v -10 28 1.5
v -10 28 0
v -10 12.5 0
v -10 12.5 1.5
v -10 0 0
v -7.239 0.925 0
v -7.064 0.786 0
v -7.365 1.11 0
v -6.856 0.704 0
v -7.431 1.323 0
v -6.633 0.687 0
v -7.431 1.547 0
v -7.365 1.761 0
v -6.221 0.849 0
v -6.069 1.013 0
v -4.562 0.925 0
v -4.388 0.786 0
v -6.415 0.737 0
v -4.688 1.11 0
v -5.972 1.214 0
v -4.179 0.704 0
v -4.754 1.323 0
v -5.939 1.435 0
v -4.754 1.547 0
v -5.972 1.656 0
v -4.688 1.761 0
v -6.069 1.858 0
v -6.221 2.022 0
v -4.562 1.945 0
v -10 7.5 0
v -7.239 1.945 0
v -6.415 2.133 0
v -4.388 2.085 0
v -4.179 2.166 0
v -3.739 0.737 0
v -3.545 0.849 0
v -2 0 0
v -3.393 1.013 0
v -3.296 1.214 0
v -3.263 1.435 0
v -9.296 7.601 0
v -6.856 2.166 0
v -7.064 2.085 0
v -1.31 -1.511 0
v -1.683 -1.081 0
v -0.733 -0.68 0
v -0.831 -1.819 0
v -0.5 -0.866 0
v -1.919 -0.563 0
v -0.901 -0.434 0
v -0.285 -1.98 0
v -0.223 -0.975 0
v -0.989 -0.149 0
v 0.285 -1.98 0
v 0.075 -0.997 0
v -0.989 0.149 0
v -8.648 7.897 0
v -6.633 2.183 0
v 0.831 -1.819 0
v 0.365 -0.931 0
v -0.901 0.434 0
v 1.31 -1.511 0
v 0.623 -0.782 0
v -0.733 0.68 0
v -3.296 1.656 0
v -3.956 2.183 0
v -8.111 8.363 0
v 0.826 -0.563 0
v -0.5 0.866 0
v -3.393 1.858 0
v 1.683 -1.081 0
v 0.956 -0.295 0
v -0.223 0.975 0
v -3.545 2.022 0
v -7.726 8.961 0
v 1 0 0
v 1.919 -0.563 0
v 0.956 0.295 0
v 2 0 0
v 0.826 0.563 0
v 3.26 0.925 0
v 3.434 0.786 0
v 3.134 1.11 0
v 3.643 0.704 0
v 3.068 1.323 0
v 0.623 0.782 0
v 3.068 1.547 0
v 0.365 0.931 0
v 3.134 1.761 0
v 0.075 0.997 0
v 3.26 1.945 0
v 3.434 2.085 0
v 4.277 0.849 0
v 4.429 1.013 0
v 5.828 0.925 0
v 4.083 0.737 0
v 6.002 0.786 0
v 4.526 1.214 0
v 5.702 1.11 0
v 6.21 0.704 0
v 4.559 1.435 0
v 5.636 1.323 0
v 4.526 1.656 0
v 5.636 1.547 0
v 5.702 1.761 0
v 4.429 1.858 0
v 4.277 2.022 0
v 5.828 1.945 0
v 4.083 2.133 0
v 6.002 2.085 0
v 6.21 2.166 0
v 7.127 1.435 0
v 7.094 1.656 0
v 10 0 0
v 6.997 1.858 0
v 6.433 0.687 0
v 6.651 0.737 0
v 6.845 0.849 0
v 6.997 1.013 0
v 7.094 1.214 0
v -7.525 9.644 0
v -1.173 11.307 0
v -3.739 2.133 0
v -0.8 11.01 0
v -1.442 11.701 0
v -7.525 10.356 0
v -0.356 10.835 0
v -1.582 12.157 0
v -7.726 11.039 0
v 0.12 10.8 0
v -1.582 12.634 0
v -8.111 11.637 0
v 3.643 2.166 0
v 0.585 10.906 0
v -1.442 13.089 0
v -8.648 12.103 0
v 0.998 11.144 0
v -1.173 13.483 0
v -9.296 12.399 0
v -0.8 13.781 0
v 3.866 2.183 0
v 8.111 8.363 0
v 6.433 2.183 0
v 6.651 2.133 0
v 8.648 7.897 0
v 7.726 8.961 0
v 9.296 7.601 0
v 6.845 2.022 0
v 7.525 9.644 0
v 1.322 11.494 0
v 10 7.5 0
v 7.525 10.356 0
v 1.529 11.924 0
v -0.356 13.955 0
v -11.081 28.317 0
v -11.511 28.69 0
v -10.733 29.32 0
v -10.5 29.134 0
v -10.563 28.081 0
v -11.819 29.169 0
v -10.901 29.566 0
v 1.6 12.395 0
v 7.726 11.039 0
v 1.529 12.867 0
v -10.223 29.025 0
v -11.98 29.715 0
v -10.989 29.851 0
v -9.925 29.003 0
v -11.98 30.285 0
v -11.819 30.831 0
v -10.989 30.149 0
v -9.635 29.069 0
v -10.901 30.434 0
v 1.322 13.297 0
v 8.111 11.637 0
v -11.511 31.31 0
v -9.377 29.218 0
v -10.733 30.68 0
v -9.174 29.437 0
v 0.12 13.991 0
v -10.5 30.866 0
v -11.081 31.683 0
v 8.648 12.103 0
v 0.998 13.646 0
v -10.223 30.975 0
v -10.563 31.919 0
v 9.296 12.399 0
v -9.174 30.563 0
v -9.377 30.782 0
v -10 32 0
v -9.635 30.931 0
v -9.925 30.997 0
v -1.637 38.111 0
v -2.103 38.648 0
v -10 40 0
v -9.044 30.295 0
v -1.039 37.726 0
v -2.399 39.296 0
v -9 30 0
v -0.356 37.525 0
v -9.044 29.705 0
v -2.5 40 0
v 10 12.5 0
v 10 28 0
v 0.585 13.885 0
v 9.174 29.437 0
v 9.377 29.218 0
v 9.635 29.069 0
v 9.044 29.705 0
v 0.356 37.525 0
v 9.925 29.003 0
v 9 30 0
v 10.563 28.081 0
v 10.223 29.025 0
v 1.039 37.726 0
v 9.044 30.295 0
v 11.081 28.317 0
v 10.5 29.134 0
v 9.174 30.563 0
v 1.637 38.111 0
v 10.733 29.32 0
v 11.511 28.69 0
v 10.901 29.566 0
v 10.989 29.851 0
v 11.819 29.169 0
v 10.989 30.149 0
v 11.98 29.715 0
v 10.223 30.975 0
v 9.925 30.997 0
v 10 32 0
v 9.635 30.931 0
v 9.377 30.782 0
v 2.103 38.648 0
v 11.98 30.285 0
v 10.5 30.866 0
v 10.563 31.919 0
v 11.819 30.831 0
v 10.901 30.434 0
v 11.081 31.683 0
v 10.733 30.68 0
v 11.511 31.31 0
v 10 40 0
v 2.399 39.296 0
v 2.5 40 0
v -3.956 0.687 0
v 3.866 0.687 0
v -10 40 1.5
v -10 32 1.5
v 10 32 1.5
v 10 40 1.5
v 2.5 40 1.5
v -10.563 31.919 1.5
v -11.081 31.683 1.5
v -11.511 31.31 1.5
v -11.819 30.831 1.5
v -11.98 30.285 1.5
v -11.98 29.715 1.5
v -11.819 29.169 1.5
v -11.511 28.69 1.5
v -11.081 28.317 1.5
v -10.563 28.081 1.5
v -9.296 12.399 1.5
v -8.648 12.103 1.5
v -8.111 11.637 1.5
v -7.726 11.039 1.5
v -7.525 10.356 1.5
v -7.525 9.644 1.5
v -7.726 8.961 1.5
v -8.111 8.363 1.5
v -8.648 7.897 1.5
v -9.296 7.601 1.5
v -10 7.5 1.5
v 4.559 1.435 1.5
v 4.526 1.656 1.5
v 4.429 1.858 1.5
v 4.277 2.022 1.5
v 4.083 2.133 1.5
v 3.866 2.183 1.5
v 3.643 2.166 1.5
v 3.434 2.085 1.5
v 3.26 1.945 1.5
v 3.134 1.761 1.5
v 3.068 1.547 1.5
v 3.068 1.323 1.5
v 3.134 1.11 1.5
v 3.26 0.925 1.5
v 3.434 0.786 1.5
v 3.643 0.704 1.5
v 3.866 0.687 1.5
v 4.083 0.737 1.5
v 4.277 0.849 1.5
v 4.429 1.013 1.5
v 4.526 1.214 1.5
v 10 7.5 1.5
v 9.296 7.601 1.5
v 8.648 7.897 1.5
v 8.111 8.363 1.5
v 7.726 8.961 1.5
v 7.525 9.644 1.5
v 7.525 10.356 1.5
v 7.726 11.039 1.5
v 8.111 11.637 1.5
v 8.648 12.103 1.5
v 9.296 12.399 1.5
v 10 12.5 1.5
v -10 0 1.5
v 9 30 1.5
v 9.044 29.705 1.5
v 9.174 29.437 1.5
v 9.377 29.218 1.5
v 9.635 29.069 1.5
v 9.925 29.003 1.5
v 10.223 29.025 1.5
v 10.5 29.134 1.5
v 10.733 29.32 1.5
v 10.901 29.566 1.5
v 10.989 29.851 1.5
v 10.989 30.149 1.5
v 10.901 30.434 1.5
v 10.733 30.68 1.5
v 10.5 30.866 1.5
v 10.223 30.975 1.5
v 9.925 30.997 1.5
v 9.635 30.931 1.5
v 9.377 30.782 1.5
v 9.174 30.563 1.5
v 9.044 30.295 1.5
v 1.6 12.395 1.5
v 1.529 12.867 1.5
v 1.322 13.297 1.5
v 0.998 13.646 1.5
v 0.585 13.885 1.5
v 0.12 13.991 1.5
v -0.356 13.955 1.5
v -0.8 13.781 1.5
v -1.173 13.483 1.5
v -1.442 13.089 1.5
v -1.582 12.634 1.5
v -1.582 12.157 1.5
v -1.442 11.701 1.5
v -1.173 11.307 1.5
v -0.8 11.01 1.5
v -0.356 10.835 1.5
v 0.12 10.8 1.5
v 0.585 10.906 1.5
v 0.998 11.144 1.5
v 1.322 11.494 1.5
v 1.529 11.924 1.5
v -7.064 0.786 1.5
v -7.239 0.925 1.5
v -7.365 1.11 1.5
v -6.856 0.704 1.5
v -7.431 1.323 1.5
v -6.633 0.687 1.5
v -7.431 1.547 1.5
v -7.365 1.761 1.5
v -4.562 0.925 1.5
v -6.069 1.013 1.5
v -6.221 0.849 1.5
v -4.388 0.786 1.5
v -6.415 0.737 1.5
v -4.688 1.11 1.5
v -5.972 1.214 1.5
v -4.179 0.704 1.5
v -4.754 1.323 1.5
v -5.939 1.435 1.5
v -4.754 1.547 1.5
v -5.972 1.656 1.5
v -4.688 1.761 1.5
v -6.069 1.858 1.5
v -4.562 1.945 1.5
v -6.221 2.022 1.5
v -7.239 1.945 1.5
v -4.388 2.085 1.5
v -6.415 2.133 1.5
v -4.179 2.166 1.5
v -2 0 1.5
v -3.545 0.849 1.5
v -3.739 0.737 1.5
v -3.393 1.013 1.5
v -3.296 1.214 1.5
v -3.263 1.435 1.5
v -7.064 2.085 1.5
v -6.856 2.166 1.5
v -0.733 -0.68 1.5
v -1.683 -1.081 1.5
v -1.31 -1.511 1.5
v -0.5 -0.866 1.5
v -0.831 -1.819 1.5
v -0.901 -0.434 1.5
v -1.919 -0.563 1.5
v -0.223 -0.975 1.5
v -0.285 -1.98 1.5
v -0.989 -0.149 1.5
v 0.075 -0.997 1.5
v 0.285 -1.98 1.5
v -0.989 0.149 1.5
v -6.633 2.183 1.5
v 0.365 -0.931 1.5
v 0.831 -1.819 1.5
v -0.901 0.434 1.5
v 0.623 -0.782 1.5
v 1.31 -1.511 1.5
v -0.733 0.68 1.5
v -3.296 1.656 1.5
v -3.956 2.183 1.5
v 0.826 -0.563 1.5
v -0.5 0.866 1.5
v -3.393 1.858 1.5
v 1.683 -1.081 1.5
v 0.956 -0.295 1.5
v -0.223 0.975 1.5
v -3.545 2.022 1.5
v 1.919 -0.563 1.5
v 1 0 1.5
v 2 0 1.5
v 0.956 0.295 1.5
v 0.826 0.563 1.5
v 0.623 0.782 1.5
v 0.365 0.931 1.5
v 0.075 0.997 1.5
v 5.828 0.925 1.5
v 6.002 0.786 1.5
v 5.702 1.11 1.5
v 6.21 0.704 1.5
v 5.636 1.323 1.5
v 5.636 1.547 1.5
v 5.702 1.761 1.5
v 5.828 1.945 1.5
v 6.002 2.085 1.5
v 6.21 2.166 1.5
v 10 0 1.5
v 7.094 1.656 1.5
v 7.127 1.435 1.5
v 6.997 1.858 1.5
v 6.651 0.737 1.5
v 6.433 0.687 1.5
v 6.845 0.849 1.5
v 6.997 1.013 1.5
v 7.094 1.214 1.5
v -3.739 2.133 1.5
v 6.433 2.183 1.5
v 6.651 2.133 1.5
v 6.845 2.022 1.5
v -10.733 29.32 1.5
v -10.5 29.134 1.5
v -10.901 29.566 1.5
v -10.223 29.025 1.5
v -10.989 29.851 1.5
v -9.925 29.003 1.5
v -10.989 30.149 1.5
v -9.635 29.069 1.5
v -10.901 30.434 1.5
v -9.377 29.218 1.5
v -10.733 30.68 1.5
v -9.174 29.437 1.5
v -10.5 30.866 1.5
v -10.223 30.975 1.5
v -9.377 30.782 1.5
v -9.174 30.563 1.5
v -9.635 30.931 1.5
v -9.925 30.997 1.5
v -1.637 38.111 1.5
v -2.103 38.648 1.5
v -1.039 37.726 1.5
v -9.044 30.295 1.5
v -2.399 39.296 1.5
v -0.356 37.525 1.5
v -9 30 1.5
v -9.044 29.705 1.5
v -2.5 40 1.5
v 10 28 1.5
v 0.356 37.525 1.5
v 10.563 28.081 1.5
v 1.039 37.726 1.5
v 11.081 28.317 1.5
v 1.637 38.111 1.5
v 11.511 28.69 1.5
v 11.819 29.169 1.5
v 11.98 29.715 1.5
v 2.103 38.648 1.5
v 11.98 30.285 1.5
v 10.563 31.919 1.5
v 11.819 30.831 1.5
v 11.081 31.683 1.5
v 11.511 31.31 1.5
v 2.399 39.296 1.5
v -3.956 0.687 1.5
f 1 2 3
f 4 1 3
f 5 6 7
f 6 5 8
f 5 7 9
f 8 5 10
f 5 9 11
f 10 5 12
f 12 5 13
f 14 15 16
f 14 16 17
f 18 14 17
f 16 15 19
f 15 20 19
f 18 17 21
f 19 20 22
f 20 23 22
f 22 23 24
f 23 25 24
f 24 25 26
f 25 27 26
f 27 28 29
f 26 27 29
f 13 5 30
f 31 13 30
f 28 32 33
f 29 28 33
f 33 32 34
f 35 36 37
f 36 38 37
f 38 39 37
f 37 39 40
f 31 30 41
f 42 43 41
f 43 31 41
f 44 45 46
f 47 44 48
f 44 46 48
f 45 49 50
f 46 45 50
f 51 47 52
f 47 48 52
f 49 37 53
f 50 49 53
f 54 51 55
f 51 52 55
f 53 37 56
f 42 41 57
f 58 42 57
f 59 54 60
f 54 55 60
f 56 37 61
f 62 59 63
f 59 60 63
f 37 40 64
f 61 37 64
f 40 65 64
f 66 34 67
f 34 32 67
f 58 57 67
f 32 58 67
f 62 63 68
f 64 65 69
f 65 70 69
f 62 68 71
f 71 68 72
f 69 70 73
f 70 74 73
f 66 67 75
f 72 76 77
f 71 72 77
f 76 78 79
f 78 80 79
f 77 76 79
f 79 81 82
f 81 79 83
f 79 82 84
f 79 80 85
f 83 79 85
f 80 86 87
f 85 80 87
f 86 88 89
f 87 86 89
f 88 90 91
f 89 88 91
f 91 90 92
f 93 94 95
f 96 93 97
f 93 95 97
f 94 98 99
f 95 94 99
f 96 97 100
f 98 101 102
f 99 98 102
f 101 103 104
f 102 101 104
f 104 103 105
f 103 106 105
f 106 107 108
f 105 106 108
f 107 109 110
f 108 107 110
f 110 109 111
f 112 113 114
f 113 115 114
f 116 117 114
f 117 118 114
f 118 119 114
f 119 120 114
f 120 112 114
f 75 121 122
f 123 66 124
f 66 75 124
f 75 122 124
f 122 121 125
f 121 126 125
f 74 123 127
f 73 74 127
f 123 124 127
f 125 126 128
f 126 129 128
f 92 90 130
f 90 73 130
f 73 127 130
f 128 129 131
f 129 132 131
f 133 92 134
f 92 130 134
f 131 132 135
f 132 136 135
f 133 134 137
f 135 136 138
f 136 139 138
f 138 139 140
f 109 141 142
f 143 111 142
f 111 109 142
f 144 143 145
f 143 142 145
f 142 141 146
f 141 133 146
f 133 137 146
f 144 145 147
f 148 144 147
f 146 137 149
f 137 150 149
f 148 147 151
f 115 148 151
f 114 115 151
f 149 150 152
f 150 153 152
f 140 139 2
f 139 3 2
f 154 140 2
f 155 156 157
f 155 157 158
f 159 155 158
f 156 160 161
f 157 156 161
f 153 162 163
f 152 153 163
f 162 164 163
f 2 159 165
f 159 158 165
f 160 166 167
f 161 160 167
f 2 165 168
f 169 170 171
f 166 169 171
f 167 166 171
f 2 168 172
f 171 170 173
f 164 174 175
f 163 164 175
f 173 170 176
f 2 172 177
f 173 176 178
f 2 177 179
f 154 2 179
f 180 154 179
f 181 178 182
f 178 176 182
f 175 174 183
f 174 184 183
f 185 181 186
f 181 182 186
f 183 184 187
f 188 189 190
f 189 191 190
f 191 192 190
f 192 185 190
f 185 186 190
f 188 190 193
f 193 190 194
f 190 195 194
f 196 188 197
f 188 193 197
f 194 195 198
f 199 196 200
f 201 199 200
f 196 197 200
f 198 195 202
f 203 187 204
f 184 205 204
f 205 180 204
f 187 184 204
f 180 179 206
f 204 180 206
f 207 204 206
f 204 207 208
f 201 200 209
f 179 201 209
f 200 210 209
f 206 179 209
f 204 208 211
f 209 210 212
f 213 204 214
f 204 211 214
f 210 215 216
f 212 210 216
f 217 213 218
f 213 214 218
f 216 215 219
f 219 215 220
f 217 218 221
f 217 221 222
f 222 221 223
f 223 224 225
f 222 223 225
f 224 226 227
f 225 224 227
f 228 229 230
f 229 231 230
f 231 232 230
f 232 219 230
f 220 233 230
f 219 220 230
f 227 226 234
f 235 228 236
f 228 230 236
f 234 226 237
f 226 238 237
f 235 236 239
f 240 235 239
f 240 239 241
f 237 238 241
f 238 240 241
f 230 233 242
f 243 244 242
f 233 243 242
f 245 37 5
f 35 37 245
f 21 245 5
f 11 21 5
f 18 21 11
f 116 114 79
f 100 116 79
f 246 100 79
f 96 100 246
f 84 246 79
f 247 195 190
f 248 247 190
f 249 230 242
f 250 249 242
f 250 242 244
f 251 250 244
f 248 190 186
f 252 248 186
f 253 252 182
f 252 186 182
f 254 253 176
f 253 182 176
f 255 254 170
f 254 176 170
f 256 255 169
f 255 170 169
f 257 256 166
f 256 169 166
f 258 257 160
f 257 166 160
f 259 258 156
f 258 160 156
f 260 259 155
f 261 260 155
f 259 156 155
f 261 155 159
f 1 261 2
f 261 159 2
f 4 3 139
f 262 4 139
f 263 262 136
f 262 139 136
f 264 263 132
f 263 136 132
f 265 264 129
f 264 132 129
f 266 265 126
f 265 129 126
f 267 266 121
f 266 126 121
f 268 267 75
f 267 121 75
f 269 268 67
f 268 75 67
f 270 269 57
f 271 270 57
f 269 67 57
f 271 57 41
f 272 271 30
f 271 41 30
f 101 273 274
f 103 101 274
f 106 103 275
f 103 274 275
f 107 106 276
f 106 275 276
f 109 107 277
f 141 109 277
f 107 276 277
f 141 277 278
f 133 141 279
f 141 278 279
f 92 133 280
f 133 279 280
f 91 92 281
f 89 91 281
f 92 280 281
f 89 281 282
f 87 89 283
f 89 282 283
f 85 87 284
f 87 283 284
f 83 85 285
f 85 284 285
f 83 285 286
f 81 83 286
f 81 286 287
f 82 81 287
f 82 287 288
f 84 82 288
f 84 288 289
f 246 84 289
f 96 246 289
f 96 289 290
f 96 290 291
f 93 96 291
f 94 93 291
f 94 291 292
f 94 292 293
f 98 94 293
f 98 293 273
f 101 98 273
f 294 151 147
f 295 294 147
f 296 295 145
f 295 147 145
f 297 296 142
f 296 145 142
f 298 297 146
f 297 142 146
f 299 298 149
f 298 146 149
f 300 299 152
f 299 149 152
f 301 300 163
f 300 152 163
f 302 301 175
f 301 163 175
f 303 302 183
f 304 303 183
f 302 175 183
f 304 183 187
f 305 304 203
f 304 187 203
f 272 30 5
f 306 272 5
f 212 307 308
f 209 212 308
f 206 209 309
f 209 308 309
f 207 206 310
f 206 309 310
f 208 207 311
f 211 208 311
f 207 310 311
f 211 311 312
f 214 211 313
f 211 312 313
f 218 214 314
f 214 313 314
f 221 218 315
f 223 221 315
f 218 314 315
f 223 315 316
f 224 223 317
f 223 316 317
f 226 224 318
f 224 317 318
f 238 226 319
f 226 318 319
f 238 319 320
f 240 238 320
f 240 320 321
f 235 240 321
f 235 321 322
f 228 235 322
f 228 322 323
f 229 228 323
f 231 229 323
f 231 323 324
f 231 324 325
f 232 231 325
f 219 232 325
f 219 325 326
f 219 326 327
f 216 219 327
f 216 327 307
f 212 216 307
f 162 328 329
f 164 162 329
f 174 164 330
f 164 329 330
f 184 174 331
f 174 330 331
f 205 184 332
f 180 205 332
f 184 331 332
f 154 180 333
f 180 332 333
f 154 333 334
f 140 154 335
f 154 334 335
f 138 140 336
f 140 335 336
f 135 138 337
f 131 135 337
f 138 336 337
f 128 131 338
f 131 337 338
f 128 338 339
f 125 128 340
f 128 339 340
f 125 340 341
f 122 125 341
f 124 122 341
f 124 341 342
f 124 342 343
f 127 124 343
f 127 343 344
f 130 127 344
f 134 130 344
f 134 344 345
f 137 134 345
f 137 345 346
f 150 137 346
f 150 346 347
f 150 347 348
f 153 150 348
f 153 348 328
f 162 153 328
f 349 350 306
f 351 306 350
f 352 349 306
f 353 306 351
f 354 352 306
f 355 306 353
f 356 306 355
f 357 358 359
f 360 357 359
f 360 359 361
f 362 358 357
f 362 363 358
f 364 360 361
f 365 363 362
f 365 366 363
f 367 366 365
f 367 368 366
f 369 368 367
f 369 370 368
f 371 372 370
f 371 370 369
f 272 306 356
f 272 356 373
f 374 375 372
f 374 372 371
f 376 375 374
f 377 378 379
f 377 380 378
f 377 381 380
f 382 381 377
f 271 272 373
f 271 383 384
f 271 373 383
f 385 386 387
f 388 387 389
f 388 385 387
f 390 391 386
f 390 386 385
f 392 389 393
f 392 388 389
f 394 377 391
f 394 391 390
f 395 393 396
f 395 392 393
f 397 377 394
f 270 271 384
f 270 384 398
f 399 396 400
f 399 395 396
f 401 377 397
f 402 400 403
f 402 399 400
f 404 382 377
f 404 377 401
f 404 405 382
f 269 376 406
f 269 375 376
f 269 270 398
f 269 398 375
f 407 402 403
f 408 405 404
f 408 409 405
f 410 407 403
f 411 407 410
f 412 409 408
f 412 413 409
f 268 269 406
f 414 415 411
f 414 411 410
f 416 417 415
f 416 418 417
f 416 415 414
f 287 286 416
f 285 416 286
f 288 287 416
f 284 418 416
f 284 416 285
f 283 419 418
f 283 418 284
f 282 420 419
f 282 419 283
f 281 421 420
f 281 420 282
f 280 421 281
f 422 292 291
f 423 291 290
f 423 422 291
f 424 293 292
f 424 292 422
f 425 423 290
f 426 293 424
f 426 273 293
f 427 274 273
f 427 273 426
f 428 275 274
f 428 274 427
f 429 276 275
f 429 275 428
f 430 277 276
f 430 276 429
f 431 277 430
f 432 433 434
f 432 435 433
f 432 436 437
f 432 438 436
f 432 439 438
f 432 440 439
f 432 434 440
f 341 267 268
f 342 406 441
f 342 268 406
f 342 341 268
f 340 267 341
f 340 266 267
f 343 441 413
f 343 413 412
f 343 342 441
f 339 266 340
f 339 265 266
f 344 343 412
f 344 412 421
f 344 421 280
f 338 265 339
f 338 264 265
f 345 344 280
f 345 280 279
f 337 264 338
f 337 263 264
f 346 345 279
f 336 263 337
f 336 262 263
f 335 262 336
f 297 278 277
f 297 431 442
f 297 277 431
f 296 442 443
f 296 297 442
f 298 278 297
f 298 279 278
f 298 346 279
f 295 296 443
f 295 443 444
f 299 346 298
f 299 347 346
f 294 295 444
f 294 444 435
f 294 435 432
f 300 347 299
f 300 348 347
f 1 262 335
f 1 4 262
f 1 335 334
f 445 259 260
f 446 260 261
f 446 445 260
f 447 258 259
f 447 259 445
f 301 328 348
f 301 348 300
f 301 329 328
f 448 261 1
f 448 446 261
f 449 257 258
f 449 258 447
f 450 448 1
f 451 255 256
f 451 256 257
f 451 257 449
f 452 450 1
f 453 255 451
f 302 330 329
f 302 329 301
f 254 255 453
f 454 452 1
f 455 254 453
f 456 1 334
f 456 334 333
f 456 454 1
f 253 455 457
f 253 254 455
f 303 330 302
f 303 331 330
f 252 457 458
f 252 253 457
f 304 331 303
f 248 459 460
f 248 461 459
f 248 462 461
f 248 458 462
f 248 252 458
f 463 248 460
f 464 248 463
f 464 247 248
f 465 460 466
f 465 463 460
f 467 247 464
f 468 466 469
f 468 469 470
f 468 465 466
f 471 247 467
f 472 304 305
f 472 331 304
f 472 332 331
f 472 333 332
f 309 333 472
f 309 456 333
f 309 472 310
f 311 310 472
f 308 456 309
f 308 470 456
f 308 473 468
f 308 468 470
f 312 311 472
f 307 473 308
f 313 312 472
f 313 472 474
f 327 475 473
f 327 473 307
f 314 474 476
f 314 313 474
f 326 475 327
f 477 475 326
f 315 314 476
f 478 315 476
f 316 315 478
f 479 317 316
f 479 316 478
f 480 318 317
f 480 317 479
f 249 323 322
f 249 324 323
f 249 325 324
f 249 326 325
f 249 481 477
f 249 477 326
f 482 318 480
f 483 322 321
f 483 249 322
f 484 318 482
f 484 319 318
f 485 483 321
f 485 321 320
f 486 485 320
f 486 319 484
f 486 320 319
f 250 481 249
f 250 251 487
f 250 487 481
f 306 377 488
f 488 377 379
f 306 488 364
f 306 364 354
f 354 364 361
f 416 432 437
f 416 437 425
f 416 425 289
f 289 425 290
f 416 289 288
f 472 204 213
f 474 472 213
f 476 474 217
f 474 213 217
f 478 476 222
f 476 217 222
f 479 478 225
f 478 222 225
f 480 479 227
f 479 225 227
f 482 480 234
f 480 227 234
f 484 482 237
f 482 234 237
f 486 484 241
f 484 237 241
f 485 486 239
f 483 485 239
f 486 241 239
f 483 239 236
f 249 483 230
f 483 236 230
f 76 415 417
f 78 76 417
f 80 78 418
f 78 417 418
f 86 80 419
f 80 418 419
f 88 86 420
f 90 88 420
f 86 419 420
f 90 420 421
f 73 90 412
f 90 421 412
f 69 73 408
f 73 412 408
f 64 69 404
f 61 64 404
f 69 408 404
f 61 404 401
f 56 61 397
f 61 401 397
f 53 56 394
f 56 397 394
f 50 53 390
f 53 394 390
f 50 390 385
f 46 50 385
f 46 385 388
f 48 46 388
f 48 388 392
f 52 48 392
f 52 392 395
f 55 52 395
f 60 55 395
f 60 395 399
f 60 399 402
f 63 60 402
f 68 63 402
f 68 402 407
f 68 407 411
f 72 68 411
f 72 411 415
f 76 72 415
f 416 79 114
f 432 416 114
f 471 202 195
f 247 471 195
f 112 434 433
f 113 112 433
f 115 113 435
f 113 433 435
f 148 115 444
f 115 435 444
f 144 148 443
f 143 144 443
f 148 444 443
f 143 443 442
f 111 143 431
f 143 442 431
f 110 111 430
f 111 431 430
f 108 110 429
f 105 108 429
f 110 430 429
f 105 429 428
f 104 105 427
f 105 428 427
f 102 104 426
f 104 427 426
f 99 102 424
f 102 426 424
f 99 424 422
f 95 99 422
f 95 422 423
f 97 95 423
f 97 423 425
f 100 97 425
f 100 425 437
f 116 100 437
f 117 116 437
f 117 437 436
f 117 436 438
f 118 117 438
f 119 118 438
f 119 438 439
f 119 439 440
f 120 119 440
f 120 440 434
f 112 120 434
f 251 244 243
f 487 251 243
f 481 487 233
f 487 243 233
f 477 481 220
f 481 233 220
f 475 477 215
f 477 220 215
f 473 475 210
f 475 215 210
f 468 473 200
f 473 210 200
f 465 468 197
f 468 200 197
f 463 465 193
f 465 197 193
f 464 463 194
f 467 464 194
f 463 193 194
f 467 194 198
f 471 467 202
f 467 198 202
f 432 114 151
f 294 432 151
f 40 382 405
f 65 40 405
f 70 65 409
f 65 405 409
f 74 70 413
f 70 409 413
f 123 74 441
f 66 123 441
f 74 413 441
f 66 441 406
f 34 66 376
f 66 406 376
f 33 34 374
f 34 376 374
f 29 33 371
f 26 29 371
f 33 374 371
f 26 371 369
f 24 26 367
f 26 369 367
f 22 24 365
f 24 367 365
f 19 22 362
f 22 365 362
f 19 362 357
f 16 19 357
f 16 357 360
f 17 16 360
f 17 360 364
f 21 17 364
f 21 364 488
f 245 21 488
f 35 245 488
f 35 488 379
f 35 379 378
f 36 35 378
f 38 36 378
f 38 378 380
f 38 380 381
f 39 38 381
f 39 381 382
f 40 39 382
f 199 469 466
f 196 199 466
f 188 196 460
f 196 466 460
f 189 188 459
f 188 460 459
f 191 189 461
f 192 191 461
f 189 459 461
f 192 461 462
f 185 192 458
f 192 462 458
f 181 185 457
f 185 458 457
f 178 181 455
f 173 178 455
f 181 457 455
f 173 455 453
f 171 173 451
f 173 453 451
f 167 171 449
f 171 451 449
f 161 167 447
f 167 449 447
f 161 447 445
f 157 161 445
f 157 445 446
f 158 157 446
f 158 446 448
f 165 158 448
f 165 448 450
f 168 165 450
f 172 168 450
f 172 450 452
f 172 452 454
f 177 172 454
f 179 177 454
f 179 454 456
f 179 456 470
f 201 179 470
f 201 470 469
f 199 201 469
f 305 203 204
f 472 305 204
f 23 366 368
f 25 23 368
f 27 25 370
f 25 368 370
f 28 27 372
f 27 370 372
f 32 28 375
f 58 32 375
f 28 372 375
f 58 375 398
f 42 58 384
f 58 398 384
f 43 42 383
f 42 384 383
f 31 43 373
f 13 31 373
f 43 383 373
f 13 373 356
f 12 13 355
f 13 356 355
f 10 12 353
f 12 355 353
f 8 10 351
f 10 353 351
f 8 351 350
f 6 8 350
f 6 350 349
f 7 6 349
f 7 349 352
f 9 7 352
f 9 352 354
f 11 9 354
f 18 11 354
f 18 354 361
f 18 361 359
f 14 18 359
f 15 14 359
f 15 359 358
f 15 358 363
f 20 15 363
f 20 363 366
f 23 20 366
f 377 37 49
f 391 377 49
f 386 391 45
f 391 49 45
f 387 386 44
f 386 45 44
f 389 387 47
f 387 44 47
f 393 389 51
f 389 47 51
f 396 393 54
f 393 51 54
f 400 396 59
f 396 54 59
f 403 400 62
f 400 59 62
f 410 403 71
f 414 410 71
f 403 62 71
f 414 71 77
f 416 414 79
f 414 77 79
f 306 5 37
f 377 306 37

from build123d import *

# Parameters (mm, degrees)
PCB_DEPTH                = 1.5
ESQUISSE3_R              = 1
ESQUISSE3_R_2            = 0.75
TROUS_DEPTH              = 42.788156217
M3_CLEARANCE_HOLE2_D     = 3.2
M3_CLEARANCE_HOLE2_DEPTH = 5
M3_CLEARANCE_HOLE2_TIP   = 0.96137699


with BuildPart() as part:
    # Esquisse2 → PCB (new body)
    with BuildSketch(Plane.XY):
        with BuildLine():
            Line((-10, 0), (-2, 0))
            ThreePointArc((-2, 0), (0, -2), (2, 0))
            Line((2, 0), (10, 0))
            Line((10, 0), (10, 7.5))
            ThreePointArc((10, 7.5), (7.5, 10), (10, 12.5))
            Line((10, 12.5), (10, 28))
            ThreePointArc((10, 28), (12, 30), (10, 32))
            Line((10, 32), (10, 40))
            Line((10, 40), (2.5, 40))
            ThreePointArc((2.5, 40), (0, 37.5), (-2.5, 40))
            Line((-2.5, 40), (-10, 40))
            Line((-10, 40), (-10, 32))
            ThreePointArc((-10, 32), (-12, 30), (-10, 28))
            Line((-10, 28), (-10, 12.5))
            ThreePointArc((-10, 12.5), (-7.5, 10), (-10, 7.5))
            Line((-10, 7.5), (-10, 0))
        make_face()
    extrude(amount=PCB_DEPTH)

    # Esquisse3 → Trous (cut, through all)
    with BuildSketch(Plane.XY.offset(1.5)):
        with Locations((-10, 30)):
            Circle(ESQUISSE3_R)
        with Locations((6.37737312, 1.435143304)):
            Circle(ESQUISSE3_R_2)
        with Locations(Location((10, 30, 0), (0, 0, 180))):
            Circle(ESQUISSE3_R)
        Circle(ESQUISSE3_R)
        with Locations((3.809466202, 1.435143304)):
            Circle(ESQUISSE3_R_2)
        with Locations((-4.012518268, 1.435143304)):
            Circle(ESQUISSE3_R_2)
        with Locations((-6.688956118, 1.435143304)):
            Circle(ESQUISSE3_R_2)
    extrude(amount=-TROUS_DEPTH, mode=Mode.SUBTRACT)

    # M3 Clearance Hole2
    with Locations(Plane(origin=(0, 0, 0), x_dir=(-1, 0, 0), z_dir=(0, 0, -1))):
        with Locations((0, 12.3952)):
            Hole(M3_CLEARANCE_HOLE2_D / 2, depth=M3_CLEARANCE_HOLE2_DEPTH)
            with Locations((0, 0, -(M3_CLEARANCE_HOLE2_DEPTH + M3_CLEARANCE_HOLE2_TIP / 2))):  # 118° drill point
                Cone(0, M3_CLEARANCE_HOLE2_D / 2, M3_CLEARANCE_HOLE2_TIP, mode=Mode.SUBTRACT)


solid = part.part
